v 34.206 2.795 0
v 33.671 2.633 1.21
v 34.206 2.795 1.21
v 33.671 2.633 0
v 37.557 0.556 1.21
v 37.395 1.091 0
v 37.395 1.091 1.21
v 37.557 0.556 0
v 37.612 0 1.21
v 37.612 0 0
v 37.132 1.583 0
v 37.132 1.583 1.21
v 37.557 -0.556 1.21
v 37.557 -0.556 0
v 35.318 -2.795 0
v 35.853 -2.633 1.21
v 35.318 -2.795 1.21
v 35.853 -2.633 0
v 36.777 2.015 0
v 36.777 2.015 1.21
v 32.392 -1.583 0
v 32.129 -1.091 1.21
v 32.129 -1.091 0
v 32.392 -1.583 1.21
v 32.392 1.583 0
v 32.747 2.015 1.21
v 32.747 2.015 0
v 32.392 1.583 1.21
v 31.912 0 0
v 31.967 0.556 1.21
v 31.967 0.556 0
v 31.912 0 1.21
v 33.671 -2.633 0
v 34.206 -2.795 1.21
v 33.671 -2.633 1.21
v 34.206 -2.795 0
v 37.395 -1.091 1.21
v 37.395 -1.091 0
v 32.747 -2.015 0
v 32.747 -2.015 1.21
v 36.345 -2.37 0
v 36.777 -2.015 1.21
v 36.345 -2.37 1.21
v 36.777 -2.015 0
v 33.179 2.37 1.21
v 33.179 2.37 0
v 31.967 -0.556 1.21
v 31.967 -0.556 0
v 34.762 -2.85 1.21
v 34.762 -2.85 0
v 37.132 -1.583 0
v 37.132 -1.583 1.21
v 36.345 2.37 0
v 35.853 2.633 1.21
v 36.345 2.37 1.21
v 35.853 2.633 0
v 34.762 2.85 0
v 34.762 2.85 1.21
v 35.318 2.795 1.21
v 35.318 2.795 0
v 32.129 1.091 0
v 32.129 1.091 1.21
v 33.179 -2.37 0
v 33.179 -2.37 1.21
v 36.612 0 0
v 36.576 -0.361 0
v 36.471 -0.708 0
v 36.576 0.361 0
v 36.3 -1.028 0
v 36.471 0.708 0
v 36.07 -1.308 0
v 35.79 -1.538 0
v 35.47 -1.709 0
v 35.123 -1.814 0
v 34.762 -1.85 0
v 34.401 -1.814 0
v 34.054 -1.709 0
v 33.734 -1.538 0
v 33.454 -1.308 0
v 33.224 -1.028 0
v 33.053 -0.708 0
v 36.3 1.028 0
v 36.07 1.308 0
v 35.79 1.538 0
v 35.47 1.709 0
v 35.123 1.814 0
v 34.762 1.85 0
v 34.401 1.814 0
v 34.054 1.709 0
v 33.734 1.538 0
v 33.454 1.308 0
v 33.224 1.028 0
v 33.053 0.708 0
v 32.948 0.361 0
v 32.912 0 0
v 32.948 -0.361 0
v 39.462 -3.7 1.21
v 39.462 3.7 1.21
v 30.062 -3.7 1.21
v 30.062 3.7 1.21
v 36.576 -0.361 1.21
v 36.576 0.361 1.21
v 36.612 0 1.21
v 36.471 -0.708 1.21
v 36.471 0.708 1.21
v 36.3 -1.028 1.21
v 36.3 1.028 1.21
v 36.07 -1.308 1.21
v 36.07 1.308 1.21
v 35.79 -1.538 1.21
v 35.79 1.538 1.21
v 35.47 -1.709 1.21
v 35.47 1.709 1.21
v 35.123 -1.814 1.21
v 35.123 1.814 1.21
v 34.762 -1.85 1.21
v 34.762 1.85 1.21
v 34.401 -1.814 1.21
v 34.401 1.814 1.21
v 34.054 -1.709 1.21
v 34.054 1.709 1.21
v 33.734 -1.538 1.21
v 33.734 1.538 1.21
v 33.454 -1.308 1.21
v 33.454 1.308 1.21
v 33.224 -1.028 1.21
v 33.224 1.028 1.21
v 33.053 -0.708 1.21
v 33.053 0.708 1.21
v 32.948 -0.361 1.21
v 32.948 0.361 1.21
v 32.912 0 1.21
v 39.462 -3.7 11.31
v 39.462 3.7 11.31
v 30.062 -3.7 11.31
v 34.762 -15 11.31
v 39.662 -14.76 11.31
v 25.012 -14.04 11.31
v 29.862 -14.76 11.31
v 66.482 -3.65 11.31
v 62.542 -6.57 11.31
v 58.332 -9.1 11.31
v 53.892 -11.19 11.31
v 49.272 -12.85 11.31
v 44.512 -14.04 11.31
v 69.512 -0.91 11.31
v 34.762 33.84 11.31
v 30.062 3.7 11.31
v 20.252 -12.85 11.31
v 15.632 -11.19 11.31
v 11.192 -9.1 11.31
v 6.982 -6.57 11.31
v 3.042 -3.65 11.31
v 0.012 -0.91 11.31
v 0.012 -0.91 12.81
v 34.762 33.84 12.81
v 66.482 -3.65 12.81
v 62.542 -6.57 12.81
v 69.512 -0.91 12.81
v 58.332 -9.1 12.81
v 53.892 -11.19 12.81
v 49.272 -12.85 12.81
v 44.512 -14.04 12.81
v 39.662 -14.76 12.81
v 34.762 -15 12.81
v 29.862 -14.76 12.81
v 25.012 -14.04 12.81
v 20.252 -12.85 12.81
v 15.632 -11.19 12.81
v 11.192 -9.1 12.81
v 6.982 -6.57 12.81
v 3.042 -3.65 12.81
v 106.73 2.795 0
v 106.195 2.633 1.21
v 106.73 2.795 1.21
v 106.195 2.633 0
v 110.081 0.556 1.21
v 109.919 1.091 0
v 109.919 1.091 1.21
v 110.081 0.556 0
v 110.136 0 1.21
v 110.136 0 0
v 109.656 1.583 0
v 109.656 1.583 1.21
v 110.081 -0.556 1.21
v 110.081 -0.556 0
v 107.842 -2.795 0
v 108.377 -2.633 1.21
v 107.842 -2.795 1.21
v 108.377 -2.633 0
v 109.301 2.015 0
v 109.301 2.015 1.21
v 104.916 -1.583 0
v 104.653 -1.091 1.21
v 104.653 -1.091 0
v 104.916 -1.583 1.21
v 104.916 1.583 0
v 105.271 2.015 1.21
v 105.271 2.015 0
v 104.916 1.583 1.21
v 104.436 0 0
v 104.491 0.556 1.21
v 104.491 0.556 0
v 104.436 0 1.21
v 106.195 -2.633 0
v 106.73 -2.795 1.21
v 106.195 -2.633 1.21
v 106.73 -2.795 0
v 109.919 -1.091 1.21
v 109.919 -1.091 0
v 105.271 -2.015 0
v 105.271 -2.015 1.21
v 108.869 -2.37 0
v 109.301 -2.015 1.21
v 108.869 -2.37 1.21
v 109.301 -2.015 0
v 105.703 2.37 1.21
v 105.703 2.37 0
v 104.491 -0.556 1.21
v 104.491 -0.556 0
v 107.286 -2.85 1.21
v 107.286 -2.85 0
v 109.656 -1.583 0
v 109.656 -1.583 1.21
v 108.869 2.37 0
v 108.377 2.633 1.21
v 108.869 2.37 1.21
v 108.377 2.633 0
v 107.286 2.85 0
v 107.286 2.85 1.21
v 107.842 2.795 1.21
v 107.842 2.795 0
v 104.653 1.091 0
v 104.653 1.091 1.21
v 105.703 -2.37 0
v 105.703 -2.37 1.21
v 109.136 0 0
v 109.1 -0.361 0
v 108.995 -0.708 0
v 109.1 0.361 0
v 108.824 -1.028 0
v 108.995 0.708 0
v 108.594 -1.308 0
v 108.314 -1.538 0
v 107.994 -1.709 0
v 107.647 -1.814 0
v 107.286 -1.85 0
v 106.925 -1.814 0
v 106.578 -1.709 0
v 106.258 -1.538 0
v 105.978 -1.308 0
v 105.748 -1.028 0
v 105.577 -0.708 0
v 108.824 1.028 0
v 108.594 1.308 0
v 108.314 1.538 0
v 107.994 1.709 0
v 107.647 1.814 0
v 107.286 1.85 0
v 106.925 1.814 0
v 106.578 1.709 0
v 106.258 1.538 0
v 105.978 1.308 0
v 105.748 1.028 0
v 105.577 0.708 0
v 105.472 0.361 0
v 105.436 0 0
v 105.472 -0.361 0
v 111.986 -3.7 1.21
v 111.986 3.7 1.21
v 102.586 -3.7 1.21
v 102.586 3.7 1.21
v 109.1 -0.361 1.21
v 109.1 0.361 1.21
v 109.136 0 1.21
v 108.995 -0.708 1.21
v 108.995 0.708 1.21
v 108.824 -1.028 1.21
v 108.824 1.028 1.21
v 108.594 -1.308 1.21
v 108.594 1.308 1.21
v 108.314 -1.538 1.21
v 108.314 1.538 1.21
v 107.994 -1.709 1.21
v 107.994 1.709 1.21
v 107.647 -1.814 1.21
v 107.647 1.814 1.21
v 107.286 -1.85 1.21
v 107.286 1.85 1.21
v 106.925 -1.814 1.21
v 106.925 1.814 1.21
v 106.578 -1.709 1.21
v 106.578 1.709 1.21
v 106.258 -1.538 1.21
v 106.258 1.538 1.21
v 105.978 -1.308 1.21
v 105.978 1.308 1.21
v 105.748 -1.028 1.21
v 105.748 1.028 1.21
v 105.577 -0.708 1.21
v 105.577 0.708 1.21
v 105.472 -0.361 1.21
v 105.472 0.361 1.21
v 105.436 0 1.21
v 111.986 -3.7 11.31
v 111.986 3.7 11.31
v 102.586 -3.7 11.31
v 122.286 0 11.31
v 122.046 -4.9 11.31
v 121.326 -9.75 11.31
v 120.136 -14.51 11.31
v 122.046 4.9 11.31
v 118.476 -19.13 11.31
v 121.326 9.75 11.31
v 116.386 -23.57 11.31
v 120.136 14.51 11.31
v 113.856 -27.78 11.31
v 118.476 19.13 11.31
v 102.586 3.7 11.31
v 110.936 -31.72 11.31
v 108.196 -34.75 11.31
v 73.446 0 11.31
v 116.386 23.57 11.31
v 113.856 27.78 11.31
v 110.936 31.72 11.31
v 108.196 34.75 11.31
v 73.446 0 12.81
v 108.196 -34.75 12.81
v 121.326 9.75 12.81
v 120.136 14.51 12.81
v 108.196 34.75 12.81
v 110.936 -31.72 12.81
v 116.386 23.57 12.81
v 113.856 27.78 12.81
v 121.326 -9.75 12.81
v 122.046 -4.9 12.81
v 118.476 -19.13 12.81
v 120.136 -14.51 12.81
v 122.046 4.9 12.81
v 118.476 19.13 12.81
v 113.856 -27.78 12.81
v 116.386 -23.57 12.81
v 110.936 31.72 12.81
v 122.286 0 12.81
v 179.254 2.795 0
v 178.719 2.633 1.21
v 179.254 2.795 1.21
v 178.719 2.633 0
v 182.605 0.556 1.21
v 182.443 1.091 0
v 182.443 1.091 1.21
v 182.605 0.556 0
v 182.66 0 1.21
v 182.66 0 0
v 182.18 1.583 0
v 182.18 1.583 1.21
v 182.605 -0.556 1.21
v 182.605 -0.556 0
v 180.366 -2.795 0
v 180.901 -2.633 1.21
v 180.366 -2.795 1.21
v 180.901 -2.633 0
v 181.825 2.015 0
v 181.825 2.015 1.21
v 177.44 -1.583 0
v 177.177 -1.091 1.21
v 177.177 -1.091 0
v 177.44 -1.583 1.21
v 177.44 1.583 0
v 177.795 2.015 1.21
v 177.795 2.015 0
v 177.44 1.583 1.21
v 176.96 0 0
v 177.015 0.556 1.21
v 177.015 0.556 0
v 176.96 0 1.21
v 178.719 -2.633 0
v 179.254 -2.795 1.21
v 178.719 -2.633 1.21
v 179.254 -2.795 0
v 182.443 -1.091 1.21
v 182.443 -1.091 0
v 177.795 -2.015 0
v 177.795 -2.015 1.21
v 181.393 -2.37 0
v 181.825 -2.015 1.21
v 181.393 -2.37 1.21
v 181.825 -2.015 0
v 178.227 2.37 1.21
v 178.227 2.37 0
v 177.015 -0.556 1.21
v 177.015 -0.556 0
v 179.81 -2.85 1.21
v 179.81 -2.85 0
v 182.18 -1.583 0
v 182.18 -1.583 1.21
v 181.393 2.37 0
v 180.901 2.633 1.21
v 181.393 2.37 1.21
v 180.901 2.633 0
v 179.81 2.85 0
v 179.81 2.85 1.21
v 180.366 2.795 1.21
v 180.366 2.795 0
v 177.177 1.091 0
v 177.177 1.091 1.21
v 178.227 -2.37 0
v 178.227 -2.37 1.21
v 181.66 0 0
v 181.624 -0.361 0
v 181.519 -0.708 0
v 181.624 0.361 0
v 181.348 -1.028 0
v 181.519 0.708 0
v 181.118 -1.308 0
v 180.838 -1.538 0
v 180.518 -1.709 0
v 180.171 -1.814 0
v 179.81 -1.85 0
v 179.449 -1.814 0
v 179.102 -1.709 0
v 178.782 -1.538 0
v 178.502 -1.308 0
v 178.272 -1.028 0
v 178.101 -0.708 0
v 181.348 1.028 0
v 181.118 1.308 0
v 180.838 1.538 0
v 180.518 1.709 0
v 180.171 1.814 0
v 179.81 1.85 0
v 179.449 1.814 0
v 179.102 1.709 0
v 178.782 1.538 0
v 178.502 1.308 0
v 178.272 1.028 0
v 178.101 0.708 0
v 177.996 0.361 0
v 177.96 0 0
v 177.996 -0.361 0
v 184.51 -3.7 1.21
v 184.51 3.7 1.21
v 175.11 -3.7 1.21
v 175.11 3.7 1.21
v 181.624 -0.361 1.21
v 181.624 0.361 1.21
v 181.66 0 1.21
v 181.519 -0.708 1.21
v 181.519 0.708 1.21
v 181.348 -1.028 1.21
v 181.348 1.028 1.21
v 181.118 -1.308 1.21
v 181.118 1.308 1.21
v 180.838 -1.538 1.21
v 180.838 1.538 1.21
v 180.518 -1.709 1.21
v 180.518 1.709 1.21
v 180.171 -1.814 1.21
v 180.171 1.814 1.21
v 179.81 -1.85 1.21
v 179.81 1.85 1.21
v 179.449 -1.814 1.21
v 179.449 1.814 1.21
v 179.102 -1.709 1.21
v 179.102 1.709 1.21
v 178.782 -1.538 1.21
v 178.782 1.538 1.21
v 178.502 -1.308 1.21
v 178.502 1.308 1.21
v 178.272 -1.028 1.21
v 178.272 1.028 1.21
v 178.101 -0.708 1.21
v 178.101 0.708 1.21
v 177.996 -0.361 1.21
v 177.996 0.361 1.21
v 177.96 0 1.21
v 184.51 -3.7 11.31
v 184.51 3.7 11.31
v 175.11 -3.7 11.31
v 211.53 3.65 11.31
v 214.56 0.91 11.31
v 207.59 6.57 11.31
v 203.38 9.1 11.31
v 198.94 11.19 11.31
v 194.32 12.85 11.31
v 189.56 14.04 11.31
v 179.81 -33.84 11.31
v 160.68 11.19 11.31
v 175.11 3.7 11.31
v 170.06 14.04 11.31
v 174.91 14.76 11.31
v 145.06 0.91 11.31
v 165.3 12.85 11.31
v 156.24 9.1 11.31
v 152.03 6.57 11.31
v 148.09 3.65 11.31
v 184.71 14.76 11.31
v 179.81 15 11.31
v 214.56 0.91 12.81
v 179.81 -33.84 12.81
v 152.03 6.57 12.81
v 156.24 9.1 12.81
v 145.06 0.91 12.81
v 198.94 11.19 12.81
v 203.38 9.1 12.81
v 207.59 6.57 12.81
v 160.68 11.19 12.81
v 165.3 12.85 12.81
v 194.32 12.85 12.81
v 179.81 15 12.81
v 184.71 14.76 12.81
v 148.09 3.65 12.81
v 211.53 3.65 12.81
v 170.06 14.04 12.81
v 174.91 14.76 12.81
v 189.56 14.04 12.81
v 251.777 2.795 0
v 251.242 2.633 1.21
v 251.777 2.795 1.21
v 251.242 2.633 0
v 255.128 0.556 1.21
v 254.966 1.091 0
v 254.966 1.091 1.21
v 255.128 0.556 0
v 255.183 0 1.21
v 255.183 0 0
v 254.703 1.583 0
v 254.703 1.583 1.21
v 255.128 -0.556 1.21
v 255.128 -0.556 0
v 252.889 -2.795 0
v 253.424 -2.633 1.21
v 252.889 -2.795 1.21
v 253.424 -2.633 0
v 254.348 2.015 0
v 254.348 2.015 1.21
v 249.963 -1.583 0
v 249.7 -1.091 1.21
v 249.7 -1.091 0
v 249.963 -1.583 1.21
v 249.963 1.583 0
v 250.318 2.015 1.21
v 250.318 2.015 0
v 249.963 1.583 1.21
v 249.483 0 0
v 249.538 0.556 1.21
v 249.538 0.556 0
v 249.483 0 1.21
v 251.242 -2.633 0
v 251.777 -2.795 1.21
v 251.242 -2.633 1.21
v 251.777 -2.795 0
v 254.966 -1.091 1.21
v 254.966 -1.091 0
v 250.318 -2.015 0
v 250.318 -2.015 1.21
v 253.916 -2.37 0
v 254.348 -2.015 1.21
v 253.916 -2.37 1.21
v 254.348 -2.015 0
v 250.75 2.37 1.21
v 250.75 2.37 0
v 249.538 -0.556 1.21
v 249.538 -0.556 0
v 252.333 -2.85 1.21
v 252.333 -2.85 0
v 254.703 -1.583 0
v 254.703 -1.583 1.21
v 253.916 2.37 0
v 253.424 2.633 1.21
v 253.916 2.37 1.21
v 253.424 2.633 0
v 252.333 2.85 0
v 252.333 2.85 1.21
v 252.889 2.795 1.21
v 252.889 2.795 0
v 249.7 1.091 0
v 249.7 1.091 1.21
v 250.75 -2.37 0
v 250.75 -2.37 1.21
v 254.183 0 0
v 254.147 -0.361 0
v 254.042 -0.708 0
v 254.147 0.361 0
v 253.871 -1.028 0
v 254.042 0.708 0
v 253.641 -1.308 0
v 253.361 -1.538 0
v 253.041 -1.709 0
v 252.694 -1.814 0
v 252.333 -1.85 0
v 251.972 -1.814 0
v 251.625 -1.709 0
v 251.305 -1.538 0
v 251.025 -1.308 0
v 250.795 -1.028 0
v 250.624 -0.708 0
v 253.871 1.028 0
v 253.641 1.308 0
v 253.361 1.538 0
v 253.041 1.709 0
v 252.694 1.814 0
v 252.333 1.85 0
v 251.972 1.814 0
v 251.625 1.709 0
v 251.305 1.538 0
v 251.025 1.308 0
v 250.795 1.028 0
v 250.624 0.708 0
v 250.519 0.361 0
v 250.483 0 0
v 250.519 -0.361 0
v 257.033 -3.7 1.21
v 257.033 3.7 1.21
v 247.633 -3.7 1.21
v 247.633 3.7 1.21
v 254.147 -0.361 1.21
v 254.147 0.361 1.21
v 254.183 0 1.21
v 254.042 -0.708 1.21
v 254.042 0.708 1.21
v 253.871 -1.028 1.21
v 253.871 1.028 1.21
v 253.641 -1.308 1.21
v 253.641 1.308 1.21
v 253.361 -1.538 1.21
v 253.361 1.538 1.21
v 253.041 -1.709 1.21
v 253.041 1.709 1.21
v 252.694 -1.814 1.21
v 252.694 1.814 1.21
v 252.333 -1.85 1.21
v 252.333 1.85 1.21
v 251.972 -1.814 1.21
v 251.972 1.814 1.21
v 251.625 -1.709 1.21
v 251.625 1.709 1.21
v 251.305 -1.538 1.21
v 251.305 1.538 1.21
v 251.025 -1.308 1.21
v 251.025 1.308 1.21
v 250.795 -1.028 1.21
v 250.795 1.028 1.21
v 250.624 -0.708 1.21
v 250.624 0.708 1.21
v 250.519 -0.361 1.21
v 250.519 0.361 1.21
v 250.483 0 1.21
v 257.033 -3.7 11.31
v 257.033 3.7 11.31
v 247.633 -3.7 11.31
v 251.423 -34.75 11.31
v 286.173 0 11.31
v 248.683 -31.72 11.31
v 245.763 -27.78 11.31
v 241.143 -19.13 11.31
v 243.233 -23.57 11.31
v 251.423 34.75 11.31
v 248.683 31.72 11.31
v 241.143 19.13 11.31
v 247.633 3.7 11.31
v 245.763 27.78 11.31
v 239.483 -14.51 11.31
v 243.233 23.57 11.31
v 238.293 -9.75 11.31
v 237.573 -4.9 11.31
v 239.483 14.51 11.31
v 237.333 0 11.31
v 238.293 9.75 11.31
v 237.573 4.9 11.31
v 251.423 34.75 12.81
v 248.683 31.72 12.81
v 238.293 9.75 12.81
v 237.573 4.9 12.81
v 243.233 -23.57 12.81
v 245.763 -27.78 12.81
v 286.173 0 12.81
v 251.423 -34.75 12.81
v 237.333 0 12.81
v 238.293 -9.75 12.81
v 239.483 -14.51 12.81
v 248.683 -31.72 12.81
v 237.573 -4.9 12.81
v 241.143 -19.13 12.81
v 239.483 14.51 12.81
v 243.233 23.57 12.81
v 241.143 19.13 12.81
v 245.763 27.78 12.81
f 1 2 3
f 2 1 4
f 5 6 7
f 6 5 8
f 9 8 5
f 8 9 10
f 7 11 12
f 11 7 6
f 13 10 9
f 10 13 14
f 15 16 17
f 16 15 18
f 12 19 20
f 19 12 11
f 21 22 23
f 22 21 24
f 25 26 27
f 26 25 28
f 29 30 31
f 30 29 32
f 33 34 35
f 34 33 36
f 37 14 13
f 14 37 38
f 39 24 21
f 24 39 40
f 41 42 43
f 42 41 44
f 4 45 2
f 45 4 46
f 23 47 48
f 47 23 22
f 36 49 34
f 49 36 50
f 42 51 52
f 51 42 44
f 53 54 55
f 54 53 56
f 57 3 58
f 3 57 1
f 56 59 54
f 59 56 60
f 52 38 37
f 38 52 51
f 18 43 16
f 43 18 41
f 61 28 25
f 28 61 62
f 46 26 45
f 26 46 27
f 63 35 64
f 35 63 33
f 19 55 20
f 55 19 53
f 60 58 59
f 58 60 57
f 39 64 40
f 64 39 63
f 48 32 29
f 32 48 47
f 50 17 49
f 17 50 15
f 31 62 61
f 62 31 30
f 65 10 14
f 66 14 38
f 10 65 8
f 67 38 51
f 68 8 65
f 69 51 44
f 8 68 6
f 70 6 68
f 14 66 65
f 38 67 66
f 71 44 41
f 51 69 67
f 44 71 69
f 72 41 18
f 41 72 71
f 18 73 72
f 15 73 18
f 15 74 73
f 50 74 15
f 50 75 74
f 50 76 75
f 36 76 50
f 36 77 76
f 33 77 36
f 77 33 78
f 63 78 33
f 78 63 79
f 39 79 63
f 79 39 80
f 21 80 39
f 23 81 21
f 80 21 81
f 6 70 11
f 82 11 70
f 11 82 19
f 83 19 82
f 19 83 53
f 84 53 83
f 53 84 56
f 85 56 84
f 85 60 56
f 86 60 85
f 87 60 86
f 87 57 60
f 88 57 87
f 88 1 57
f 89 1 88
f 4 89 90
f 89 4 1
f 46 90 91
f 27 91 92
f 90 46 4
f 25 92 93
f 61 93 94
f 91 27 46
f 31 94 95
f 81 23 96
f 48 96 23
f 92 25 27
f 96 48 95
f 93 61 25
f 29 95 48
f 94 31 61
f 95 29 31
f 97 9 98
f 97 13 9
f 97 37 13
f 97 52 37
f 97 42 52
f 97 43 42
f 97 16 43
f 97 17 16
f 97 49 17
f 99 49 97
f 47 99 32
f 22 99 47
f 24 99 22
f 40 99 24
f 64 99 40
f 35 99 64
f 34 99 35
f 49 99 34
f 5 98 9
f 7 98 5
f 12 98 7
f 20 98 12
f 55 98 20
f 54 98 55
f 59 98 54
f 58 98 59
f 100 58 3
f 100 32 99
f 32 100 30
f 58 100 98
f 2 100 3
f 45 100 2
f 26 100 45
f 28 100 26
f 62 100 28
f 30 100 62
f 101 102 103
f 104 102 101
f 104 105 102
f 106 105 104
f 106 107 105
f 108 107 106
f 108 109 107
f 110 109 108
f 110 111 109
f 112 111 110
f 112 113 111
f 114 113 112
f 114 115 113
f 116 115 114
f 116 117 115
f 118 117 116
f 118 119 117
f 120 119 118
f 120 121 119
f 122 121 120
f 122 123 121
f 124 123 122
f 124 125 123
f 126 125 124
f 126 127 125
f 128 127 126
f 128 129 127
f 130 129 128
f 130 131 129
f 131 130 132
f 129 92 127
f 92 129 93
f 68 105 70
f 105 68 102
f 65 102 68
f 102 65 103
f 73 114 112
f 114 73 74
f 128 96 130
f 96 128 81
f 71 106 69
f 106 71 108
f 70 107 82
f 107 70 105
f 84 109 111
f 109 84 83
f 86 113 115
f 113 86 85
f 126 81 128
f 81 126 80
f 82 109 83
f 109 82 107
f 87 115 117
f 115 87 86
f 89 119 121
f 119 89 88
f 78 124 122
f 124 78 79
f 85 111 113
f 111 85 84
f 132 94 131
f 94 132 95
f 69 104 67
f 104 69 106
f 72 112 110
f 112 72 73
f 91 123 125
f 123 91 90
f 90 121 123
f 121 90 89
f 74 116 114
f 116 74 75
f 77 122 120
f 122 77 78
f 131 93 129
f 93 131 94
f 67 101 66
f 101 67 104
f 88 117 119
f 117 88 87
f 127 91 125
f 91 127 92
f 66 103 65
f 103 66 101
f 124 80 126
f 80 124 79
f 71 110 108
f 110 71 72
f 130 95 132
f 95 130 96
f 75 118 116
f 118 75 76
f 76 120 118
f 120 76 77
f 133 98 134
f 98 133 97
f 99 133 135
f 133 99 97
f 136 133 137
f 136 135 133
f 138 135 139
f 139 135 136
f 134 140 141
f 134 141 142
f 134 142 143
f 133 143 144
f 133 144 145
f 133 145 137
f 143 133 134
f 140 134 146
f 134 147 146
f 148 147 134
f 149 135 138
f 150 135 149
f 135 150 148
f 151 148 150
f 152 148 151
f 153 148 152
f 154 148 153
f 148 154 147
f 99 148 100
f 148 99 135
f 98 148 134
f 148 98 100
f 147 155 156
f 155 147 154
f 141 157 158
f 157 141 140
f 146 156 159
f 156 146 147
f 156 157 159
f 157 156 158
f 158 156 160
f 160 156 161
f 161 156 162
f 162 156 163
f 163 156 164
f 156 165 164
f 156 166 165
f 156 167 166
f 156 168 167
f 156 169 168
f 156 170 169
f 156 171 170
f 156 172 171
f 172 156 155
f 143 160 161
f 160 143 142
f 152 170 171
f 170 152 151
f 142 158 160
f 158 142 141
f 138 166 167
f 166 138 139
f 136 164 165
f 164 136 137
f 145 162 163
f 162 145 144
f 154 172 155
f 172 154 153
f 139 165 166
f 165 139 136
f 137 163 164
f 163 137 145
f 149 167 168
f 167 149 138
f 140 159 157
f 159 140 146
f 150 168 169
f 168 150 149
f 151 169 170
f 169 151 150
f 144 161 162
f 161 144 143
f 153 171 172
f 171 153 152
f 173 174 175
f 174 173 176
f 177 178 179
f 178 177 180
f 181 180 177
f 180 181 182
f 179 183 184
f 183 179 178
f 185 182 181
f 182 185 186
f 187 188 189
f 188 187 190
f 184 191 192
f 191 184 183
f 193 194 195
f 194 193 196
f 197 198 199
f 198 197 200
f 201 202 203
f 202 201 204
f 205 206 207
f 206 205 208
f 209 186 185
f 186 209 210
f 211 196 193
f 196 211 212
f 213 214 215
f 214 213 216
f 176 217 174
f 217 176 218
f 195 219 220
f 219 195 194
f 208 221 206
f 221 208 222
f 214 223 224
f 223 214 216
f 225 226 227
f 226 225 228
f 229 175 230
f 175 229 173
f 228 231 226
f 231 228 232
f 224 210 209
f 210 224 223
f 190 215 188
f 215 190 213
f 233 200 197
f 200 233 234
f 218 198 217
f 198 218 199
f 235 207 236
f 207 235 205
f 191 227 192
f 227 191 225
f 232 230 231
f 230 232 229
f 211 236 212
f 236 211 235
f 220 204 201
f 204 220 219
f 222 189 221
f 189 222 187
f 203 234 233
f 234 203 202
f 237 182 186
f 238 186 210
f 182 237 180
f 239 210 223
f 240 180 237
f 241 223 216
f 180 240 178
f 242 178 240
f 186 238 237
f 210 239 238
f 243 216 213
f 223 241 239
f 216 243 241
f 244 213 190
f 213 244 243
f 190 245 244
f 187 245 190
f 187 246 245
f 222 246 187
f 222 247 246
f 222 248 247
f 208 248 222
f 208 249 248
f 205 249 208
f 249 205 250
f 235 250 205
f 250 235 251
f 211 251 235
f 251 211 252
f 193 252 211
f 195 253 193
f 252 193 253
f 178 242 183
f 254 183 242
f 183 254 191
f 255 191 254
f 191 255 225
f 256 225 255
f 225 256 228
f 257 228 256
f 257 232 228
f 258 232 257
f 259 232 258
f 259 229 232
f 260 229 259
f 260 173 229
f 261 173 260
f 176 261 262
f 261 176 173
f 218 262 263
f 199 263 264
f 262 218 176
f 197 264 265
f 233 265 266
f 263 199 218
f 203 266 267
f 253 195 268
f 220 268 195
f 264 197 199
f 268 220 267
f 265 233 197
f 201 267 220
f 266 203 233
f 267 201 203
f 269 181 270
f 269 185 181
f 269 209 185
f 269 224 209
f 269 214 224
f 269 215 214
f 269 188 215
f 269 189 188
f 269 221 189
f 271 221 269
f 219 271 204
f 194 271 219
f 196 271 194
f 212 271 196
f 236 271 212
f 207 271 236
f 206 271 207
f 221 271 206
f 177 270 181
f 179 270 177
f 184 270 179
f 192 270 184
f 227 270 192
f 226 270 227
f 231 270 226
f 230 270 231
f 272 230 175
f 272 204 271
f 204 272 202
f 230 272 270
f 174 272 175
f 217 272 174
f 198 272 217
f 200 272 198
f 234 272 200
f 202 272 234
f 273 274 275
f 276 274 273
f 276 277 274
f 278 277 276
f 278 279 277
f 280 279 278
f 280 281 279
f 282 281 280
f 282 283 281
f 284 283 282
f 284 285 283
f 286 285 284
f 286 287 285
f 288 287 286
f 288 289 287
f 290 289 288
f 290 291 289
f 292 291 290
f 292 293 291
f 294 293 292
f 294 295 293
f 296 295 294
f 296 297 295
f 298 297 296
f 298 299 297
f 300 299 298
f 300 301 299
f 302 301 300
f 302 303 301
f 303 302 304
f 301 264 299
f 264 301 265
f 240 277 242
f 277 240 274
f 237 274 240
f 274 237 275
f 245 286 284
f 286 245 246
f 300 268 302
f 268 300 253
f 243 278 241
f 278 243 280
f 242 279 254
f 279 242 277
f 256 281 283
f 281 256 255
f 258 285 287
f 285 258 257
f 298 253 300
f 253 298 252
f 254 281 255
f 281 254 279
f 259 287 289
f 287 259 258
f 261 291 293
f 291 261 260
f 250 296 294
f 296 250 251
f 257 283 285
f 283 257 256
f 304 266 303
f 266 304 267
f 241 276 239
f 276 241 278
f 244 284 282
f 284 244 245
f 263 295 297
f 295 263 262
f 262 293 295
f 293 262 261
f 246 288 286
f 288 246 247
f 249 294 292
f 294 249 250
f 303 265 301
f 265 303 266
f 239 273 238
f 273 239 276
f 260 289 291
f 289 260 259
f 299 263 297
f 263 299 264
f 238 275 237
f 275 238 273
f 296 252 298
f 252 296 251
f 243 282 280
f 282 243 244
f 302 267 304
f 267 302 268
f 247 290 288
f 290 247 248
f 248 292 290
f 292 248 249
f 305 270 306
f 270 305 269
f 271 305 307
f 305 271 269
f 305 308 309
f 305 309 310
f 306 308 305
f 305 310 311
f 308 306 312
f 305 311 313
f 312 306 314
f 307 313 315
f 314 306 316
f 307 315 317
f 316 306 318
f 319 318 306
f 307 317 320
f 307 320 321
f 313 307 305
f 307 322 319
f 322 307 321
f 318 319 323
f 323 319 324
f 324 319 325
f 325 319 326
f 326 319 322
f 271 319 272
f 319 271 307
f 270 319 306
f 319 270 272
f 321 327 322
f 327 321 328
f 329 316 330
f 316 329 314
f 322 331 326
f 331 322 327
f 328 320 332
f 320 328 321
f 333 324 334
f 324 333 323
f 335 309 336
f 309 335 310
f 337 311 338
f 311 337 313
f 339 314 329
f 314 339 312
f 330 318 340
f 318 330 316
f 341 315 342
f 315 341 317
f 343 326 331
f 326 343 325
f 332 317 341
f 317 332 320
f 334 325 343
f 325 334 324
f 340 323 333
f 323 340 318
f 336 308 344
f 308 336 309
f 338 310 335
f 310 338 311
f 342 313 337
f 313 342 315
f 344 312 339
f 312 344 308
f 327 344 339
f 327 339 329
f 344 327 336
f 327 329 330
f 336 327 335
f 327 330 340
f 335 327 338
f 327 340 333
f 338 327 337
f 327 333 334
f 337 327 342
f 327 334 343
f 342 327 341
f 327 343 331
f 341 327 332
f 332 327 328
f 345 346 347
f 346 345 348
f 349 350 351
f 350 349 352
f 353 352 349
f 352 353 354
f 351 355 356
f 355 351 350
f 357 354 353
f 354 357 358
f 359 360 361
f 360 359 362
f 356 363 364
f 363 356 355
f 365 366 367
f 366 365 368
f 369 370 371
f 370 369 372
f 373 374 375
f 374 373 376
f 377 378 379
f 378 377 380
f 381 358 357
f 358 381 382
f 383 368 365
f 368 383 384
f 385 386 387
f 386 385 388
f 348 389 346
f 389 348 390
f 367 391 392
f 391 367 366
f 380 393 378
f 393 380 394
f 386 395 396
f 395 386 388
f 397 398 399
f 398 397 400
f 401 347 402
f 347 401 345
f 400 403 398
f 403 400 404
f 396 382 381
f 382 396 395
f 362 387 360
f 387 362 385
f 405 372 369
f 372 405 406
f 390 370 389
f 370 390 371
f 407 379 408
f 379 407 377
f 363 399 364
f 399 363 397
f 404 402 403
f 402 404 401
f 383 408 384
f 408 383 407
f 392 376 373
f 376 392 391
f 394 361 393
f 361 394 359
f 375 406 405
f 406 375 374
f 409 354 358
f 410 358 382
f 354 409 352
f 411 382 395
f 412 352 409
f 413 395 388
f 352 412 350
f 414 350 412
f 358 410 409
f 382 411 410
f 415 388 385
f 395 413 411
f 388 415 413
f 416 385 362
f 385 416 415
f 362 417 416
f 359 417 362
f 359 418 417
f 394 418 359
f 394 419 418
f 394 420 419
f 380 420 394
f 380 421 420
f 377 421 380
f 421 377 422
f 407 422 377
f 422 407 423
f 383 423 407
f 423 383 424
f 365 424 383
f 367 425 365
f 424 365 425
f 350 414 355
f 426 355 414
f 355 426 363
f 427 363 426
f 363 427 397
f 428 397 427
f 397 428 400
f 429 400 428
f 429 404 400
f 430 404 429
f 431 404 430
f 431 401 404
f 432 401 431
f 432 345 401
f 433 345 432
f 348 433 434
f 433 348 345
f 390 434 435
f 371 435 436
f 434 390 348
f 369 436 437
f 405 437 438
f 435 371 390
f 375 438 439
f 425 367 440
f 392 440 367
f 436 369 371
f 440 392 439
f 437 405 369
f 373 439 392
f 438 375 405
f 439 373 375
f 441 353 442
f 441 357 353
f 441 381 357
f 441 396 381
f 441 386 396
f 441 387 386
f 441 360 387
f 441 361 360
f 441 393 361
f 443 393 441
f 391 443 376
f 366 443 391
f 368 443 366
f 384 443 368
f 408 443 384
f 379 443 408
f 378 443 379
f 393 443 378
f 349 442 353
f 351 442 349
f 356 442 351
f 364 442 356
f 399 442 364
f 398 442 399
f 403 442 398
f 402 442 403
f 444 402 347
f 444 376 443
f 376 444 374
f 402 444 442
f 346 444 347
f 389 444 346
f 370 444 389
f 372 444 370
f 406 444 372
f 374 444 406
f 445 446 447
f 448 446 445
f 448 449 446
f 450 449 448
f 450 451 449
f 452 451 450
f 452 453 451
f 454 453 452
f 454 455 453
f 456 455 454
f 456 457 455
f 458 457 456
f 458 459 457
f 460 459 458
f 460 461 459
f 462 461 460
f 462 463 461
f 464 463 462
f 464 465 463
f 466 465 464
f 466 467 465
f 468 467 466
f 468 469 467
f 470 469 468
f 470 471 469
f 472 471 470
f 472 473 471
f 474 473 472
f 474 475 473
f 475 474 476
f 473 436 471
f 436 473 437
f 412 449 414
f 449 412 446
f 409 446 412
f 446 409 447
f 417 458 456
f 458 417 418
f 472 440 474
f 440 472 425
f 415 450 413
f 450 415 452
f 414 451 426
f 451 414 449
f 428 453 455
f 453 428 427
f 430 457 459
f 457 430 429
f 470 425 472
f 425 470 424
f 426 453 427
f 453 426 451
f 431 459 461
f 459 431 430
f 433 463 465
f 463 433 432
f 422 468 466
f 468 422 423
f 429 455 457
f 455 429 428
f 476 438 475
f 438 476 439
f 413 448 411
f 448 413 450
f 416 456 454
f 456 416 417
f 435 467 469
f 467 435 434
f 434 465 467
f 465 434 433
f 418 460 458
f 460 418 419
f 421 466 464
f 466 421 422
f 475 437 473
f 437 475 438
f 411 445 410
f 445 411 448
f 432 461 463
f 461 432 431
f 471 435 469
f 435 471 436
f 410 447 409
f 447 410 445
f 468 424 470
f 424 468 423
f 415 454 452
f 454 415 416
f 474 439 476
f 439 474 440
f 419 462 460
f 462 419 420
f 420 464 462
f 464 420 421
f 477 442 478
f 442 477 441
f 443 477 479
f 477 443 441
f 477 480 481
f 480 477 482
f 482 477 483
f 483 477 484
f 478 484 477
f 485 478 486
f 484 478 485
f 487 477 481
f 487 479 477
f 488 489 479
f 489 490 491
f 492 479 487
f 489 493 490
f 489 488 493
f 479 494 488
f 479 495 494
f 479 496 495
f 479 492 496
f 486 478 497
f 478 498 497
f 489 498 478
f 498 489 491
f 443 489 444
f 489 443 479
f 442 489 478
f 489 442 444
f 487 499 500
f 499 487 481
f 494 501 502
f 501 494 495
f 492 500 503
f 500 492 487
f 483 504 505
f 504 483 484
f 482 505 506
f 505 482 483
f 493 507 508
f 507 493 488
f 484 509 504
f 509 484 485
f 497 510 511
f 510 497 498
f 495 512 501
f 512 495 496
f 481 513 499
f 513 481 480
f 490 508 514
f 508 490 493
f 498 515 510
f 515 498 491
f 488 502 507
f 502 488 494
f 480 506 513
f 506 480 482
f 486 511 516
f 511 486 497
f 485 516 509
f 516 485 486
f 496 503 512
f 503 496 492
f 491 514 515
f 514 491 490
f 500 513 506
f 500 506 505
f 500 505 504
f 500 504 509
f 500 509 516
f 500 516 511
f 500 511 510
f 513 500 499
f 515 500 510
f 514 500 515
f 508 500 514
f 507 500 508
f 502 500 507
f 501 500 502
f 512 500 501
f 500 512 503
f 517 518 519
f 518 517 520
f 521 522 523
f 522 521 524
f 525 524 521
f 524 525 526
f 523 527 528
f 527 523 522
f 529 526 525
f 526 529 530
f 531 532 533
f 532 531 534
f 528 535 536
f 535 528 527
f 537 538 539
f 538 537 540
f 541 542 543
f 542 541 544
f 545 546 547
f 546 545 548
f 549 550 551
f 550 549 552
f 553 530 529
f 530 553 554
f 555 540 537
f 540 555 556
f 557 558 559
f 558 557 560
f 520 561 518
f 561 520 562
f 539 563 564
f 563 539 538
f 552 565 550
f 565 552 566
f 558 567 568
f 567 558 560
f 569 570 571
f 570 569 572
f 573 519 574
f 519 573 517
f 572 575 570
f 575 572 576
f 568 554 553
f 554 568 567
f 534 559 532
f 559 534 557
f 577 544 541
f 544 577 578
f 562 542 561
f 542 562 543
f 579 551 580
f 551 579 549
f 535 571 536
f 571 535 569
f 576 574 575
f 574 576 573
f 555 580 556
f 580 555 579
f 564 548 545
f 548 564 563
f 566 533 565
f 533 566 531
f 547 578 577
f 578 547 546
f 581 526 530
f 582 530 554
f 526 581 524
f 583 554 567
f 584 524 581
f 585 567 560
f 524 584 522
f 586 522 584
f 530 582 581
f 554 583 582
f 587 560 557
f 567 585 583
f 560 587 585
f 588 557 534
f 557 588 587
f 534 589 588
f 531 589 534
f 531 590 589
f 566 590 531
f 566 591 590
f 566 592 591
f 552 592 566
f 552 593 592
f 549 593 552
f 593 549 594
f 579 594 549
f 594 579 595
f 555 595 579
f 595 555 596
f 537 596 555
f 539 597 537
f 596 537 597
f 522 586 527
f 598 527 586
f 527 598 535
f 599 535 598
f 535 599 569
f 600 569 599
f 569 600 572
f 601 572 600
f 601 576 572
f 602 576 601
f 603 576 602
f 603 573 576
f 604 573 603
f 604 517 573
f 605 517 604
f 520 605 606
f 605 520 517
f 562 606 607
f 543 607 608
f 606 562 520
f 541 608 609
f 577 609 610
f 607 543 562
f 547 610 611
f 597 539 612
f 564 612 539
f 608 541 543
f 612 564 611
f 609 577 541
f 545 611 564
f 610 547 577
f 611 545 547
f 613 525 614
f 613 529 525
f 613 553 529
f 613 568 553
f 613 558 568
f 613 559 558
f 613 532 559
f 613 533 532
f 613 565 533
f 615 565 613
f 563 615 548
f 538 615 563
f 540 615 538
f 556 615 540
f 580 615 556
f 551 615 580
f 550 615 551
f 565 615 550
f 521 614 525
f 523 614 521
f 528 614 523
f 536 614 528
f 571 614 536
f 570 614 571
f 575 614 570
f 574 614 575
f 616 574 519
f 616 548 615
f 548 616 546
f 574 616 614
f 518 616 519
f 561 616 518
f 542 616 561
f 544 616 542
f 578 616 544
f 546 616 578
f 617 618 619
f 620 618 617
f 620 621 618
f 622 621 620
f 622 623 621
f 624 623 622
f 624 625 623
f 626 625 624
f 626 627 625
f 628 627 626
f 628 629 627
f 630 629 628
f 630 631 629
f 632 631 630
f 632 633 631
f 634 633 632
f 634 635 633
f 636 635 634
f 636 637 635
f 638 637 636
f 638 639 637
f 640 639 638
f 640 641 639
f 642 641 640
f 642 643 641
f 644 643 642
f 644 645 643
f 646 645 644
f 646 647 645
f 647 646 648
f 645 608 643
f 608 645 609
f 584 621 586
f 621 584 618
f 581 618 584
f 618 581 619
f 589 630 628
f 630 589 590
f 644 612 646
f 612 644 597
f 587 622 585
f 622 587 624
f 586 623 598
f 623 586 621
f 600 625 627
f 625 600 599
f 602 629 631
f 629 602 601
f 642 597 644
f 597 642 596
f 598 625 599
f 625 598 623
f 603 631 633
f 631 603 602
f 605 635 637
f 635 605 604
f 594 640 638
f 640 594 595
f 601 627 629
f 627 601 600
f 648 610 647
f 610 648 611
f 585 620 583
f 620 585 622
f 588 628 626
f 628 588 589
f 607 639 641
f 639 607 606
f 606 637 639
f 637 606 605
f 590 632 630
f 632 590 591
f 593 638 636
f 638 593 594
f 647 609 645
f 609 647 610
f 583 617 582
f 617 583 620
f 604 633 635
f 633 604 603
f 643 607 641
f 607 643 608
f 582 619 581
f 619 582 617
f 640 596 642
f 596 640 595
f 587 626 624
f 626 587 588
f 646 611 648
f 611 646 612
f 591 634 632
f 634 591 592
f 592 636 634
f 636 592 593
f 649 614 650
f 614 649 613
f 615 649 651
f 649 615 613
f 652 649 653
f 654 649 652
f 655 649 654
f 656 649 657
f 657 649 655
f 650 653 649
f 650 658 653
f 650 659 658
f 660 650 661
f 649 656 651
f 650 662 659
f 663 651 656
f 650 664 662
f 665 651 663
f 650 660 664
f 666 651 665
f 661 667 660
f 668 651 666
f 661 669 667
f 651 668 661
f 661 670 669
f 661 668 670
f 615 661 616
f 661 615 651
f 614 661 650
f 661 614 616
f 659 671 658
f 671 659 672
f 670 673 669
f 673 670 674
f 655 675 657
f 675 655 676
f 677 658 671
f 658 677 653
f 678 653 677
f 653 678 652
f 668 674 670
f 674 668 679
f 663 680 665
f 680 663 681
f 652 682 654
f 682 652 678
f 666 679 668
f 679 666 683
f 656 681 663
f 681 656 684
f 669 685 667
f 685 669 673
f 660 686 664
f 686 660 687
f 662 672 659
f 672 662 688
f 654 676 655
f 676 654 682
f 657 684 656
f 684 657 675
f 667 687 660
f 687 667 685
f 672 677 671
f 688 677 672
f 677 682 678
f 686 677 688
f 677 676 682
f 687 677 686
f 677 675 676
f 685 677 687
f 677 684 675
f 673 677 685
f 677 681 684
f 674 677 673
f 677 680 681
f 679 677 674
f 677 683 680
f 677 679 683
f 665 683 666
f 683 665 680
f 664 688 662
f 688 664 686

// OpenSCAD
// ============================================================
// Extra parts — separate build plate
// ============================================================

// button
translate([34.762, 0, 0]) {
  // Custom button: btn_0
  // Socket (snaps onto switch cylinder Ø3.40mm)
  difference() {
    cylinder(h = 1.210, r = 2.850, $fn = 32);
    cylinder(h = 1.210, r = 1.850, $fn = 32);
  }
  // Stem (passes through cavity + ceiling)
  translate([0, 0, 1.210])
    linear_extrude(height = 10.100)
      polygon(points = [[-4.700, -3.700], [-4.700, 3.700], [4.700, 3.700], [4.700, -3.700]]);
  // Cap
  translate([0, 0, 11.310])
    linear_extrude(height = 1.500)
      polygon(points = [[27.780, -6.570], [23.570, -9.100], [19.130, -11.190], [14.510, -12.850], [9.750, -14.040], [4.900, -14.760], [0.000, -15.000], [-4.900, -14.760], [-9.750, -14.040], [-14.510, -12.850], [-19.130, -11.190], [-23.570, -9.100], [-27.780, -6.570], [-31.720, -3.650], [-34.750, -0.910], [0.000, 33.840], [34.750, -0.910], [31.720, -3.650]]);
}

// button
translate([107.286, 0, 0]) {
  // Custom button: btn_2
  // Socket (snaps onto switch cylinder Ø3.40mm)
  difference() {
    cylinder(h = 1.210, r = 2.850, $fn = 32);
    cylinder(h = 1.210, r = 1.850, $fn = 32);
  }
  // Stem (passes through cavity + ceiling)
  translate([0, 0, 1.210])
    linear_extrude(height = 10.100)
      polygon(points = [[-4.700, -3.700], [-4.700, 3.700], [4.700, 3.700], [4.700, -3.700]]);
  // Cap
  translate([0, 0, 11.310])
    linear_extrude(height = 1.500)
      polygon(points = [[14.040, -9.750], [12.850, -14.510], [11.190, -19.130], [9.100, -23.570], [6.570, -27.780], [3.650, -31.720], [0.910, -34.750], [-33.840, 0.000], [0.910, 34.750], [3.650, 31.720], [6.570, 27.780], [9.100, 23.570], [11.190, 19.130], [12.850, 14.510], [14.040, 9.750], [14.760, 4.900], [15.000, 0.000], [14.760, -4.900]]);
}

// button
translate([179.810, 0, 0]) {
  // Custom button: btn_4
  // Socket (snaps onto switch cylinder Ø3.40mm)
  difference() {
    cylinder(h = 1.210, r = 2.850, $fn = 32);
    cylinder(h = 1.210, r = 1.850, $fn = 32);
  }
  // Stem (passes through cavity + ceiling)
  translate([0, 0, 1.210])
    linear_extrude(height = 10.100)
      polygon(points = [[-4.700, -3.700], [-4.700, 3.700], [4.700, 3.700], [4.700, -3.700]]);
  // Cap
  translate([0, 0, 11.310])
    linear_extrude(height = 1.500)
      polygon(points = [[-34.750, 0.910], [-31.720, 3.650], [-27.780, 6.570], [-23.570, 9.100], [-19.130, 11.190], [-14.510, 12.850], [-9.750, 14.040], [-4.900, 14.760], [0.000, 15.000], [4.900, 14.760], [9.750, 14.040], [14.510, 12.850], [19.130, 11.190], [23.570, 9.100], [27.780, 6.570], [31.720, 3.650], [34.750, 0.910], [-0.000, -33.840]]);
}

// button
translate([252.333, 0, 0]) {
  // Custom button: btn_6
  // Socket (snaps onto switch cylinder Ø3.40mm)
  difference() {
    cylinder(h = 1.210, r = 2.850, $fn = 32);
    cylinder(h = 1.210, r = 1.850, $fn = 32);
  }
  // Stem (passes through cavity + ceiling)
  translate([0, 0, 1.210])
    linear_extrude(height = 10.100)
      polygon(points = [[-4.700, -3.700], [-4.700, 3.700], [4.700, 3.700], [4.700, -3.700]]);
  // Cap
  translate([0, 0, 11.310])
    linear_extrude(height = 1.500)
      polygon(points = [[-3.650, -31.720], [-6.570, -27.780], [-9.100, -23.570], [-11.190, -19.130], [-12.850, -14.510], [-14.040, -9.750], [-14.760, -4.900], [-15.000, 0.000], [-14.760, 4.900], [-14.040, 9.750], [-12.850, 14.510], [-11.190, 19.130], [-9.100, 23.570], [-6.570, 27.780], [-3.650, 31.720], [-0.910, 34.750], [33.840, -0.000], [-0.910, -34.750]]);
}
